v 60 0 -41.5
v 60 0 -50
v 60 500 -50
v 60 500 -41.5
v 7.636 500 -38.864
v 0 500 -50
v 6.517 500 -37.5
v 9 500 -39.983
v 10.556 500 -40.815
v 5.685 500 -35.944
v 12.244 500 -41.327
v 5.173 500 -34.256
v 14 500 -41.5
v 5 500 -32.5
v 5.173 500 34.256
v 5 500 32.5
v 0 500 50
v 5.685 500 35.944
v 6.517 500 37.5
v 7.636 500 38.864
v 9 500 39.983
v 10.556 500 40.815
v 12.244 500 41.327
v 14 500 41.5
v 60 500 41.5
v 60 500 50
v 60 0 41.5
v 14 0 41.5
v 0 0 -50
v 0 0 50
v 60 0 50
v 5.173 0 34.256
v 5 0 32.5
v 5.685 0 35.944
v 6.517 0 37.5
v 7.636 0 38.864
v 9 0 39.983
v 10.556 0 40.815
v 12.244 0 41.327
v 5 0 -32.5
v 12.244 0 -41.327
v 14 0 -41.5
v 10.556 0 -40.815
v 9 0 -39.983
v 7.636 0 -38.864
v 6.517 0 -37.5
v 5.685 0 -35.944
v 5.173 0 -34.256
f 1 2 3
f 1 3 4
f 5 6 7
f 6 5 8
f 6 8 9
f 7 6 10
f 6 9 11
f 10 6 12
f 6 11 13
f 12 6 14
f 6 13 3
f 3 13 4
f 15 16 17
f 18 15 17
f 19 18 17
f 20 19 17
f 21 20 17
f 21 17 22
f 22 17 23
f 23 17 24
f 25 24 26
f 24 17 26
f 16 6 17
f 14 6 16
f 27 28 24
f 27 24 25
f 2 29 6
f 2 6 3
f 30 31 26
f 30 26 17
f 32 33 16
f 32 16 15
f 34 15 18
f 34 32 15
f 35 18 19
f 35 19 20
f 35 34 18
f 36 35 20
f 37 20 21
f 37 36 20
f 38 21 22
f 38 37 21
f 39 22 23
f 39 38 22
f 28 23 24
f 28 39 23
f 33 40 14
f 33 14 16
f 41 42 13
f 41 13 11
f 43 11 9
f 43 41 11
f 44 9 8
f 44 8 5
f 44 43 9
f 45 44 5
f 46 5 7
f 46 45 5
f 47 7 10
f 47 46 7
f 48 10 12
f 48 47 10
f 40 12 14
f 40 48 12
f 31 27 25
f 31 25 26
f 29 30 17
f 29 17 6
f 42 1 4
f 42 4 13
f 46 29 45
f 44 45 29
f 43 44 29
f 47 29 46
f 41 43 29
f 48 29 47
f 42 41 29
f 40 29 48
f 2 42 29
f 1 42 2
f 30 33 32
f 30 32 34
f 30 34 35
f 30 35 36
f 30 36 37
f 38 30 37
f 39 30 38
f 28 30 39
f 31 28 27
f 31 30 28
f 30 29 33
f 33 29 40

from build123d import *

# Parameters (mm, degrees)
F2_DEPTH = 500


with BuildPart() as f2:
    # F0 (on Front) → F2 (new body)
    with BuildSketch(Plane.XZ):
        with BuildLine():
            Line((0, 50), (0, 0))
            Line((0, 0), (0, -50))
            Line((0, -50), (60, -50))
            Line((60, -50), (60, -41.5))
            Line((60, -41.5), (14, -41.5))
            ThreePointArc((14, -41.5), (7.6360389693, -38.8639610307), (5, -32.5))
            Line((5, -32.5), (5, 0))
            Line((5, 0), (5, 32.5))
            ThreePointArc((5, 32.5), (7.6360389693, 38.8639610307), (14, 41.5))
            Line((14, 41.5), (60, 41.5))
            Line((60, 41.5), (60, 50))
            Line((60, 50), (0, 50))
        make_face()
    extrude(amount=-F2_DEPTH)


solid = f2.part
